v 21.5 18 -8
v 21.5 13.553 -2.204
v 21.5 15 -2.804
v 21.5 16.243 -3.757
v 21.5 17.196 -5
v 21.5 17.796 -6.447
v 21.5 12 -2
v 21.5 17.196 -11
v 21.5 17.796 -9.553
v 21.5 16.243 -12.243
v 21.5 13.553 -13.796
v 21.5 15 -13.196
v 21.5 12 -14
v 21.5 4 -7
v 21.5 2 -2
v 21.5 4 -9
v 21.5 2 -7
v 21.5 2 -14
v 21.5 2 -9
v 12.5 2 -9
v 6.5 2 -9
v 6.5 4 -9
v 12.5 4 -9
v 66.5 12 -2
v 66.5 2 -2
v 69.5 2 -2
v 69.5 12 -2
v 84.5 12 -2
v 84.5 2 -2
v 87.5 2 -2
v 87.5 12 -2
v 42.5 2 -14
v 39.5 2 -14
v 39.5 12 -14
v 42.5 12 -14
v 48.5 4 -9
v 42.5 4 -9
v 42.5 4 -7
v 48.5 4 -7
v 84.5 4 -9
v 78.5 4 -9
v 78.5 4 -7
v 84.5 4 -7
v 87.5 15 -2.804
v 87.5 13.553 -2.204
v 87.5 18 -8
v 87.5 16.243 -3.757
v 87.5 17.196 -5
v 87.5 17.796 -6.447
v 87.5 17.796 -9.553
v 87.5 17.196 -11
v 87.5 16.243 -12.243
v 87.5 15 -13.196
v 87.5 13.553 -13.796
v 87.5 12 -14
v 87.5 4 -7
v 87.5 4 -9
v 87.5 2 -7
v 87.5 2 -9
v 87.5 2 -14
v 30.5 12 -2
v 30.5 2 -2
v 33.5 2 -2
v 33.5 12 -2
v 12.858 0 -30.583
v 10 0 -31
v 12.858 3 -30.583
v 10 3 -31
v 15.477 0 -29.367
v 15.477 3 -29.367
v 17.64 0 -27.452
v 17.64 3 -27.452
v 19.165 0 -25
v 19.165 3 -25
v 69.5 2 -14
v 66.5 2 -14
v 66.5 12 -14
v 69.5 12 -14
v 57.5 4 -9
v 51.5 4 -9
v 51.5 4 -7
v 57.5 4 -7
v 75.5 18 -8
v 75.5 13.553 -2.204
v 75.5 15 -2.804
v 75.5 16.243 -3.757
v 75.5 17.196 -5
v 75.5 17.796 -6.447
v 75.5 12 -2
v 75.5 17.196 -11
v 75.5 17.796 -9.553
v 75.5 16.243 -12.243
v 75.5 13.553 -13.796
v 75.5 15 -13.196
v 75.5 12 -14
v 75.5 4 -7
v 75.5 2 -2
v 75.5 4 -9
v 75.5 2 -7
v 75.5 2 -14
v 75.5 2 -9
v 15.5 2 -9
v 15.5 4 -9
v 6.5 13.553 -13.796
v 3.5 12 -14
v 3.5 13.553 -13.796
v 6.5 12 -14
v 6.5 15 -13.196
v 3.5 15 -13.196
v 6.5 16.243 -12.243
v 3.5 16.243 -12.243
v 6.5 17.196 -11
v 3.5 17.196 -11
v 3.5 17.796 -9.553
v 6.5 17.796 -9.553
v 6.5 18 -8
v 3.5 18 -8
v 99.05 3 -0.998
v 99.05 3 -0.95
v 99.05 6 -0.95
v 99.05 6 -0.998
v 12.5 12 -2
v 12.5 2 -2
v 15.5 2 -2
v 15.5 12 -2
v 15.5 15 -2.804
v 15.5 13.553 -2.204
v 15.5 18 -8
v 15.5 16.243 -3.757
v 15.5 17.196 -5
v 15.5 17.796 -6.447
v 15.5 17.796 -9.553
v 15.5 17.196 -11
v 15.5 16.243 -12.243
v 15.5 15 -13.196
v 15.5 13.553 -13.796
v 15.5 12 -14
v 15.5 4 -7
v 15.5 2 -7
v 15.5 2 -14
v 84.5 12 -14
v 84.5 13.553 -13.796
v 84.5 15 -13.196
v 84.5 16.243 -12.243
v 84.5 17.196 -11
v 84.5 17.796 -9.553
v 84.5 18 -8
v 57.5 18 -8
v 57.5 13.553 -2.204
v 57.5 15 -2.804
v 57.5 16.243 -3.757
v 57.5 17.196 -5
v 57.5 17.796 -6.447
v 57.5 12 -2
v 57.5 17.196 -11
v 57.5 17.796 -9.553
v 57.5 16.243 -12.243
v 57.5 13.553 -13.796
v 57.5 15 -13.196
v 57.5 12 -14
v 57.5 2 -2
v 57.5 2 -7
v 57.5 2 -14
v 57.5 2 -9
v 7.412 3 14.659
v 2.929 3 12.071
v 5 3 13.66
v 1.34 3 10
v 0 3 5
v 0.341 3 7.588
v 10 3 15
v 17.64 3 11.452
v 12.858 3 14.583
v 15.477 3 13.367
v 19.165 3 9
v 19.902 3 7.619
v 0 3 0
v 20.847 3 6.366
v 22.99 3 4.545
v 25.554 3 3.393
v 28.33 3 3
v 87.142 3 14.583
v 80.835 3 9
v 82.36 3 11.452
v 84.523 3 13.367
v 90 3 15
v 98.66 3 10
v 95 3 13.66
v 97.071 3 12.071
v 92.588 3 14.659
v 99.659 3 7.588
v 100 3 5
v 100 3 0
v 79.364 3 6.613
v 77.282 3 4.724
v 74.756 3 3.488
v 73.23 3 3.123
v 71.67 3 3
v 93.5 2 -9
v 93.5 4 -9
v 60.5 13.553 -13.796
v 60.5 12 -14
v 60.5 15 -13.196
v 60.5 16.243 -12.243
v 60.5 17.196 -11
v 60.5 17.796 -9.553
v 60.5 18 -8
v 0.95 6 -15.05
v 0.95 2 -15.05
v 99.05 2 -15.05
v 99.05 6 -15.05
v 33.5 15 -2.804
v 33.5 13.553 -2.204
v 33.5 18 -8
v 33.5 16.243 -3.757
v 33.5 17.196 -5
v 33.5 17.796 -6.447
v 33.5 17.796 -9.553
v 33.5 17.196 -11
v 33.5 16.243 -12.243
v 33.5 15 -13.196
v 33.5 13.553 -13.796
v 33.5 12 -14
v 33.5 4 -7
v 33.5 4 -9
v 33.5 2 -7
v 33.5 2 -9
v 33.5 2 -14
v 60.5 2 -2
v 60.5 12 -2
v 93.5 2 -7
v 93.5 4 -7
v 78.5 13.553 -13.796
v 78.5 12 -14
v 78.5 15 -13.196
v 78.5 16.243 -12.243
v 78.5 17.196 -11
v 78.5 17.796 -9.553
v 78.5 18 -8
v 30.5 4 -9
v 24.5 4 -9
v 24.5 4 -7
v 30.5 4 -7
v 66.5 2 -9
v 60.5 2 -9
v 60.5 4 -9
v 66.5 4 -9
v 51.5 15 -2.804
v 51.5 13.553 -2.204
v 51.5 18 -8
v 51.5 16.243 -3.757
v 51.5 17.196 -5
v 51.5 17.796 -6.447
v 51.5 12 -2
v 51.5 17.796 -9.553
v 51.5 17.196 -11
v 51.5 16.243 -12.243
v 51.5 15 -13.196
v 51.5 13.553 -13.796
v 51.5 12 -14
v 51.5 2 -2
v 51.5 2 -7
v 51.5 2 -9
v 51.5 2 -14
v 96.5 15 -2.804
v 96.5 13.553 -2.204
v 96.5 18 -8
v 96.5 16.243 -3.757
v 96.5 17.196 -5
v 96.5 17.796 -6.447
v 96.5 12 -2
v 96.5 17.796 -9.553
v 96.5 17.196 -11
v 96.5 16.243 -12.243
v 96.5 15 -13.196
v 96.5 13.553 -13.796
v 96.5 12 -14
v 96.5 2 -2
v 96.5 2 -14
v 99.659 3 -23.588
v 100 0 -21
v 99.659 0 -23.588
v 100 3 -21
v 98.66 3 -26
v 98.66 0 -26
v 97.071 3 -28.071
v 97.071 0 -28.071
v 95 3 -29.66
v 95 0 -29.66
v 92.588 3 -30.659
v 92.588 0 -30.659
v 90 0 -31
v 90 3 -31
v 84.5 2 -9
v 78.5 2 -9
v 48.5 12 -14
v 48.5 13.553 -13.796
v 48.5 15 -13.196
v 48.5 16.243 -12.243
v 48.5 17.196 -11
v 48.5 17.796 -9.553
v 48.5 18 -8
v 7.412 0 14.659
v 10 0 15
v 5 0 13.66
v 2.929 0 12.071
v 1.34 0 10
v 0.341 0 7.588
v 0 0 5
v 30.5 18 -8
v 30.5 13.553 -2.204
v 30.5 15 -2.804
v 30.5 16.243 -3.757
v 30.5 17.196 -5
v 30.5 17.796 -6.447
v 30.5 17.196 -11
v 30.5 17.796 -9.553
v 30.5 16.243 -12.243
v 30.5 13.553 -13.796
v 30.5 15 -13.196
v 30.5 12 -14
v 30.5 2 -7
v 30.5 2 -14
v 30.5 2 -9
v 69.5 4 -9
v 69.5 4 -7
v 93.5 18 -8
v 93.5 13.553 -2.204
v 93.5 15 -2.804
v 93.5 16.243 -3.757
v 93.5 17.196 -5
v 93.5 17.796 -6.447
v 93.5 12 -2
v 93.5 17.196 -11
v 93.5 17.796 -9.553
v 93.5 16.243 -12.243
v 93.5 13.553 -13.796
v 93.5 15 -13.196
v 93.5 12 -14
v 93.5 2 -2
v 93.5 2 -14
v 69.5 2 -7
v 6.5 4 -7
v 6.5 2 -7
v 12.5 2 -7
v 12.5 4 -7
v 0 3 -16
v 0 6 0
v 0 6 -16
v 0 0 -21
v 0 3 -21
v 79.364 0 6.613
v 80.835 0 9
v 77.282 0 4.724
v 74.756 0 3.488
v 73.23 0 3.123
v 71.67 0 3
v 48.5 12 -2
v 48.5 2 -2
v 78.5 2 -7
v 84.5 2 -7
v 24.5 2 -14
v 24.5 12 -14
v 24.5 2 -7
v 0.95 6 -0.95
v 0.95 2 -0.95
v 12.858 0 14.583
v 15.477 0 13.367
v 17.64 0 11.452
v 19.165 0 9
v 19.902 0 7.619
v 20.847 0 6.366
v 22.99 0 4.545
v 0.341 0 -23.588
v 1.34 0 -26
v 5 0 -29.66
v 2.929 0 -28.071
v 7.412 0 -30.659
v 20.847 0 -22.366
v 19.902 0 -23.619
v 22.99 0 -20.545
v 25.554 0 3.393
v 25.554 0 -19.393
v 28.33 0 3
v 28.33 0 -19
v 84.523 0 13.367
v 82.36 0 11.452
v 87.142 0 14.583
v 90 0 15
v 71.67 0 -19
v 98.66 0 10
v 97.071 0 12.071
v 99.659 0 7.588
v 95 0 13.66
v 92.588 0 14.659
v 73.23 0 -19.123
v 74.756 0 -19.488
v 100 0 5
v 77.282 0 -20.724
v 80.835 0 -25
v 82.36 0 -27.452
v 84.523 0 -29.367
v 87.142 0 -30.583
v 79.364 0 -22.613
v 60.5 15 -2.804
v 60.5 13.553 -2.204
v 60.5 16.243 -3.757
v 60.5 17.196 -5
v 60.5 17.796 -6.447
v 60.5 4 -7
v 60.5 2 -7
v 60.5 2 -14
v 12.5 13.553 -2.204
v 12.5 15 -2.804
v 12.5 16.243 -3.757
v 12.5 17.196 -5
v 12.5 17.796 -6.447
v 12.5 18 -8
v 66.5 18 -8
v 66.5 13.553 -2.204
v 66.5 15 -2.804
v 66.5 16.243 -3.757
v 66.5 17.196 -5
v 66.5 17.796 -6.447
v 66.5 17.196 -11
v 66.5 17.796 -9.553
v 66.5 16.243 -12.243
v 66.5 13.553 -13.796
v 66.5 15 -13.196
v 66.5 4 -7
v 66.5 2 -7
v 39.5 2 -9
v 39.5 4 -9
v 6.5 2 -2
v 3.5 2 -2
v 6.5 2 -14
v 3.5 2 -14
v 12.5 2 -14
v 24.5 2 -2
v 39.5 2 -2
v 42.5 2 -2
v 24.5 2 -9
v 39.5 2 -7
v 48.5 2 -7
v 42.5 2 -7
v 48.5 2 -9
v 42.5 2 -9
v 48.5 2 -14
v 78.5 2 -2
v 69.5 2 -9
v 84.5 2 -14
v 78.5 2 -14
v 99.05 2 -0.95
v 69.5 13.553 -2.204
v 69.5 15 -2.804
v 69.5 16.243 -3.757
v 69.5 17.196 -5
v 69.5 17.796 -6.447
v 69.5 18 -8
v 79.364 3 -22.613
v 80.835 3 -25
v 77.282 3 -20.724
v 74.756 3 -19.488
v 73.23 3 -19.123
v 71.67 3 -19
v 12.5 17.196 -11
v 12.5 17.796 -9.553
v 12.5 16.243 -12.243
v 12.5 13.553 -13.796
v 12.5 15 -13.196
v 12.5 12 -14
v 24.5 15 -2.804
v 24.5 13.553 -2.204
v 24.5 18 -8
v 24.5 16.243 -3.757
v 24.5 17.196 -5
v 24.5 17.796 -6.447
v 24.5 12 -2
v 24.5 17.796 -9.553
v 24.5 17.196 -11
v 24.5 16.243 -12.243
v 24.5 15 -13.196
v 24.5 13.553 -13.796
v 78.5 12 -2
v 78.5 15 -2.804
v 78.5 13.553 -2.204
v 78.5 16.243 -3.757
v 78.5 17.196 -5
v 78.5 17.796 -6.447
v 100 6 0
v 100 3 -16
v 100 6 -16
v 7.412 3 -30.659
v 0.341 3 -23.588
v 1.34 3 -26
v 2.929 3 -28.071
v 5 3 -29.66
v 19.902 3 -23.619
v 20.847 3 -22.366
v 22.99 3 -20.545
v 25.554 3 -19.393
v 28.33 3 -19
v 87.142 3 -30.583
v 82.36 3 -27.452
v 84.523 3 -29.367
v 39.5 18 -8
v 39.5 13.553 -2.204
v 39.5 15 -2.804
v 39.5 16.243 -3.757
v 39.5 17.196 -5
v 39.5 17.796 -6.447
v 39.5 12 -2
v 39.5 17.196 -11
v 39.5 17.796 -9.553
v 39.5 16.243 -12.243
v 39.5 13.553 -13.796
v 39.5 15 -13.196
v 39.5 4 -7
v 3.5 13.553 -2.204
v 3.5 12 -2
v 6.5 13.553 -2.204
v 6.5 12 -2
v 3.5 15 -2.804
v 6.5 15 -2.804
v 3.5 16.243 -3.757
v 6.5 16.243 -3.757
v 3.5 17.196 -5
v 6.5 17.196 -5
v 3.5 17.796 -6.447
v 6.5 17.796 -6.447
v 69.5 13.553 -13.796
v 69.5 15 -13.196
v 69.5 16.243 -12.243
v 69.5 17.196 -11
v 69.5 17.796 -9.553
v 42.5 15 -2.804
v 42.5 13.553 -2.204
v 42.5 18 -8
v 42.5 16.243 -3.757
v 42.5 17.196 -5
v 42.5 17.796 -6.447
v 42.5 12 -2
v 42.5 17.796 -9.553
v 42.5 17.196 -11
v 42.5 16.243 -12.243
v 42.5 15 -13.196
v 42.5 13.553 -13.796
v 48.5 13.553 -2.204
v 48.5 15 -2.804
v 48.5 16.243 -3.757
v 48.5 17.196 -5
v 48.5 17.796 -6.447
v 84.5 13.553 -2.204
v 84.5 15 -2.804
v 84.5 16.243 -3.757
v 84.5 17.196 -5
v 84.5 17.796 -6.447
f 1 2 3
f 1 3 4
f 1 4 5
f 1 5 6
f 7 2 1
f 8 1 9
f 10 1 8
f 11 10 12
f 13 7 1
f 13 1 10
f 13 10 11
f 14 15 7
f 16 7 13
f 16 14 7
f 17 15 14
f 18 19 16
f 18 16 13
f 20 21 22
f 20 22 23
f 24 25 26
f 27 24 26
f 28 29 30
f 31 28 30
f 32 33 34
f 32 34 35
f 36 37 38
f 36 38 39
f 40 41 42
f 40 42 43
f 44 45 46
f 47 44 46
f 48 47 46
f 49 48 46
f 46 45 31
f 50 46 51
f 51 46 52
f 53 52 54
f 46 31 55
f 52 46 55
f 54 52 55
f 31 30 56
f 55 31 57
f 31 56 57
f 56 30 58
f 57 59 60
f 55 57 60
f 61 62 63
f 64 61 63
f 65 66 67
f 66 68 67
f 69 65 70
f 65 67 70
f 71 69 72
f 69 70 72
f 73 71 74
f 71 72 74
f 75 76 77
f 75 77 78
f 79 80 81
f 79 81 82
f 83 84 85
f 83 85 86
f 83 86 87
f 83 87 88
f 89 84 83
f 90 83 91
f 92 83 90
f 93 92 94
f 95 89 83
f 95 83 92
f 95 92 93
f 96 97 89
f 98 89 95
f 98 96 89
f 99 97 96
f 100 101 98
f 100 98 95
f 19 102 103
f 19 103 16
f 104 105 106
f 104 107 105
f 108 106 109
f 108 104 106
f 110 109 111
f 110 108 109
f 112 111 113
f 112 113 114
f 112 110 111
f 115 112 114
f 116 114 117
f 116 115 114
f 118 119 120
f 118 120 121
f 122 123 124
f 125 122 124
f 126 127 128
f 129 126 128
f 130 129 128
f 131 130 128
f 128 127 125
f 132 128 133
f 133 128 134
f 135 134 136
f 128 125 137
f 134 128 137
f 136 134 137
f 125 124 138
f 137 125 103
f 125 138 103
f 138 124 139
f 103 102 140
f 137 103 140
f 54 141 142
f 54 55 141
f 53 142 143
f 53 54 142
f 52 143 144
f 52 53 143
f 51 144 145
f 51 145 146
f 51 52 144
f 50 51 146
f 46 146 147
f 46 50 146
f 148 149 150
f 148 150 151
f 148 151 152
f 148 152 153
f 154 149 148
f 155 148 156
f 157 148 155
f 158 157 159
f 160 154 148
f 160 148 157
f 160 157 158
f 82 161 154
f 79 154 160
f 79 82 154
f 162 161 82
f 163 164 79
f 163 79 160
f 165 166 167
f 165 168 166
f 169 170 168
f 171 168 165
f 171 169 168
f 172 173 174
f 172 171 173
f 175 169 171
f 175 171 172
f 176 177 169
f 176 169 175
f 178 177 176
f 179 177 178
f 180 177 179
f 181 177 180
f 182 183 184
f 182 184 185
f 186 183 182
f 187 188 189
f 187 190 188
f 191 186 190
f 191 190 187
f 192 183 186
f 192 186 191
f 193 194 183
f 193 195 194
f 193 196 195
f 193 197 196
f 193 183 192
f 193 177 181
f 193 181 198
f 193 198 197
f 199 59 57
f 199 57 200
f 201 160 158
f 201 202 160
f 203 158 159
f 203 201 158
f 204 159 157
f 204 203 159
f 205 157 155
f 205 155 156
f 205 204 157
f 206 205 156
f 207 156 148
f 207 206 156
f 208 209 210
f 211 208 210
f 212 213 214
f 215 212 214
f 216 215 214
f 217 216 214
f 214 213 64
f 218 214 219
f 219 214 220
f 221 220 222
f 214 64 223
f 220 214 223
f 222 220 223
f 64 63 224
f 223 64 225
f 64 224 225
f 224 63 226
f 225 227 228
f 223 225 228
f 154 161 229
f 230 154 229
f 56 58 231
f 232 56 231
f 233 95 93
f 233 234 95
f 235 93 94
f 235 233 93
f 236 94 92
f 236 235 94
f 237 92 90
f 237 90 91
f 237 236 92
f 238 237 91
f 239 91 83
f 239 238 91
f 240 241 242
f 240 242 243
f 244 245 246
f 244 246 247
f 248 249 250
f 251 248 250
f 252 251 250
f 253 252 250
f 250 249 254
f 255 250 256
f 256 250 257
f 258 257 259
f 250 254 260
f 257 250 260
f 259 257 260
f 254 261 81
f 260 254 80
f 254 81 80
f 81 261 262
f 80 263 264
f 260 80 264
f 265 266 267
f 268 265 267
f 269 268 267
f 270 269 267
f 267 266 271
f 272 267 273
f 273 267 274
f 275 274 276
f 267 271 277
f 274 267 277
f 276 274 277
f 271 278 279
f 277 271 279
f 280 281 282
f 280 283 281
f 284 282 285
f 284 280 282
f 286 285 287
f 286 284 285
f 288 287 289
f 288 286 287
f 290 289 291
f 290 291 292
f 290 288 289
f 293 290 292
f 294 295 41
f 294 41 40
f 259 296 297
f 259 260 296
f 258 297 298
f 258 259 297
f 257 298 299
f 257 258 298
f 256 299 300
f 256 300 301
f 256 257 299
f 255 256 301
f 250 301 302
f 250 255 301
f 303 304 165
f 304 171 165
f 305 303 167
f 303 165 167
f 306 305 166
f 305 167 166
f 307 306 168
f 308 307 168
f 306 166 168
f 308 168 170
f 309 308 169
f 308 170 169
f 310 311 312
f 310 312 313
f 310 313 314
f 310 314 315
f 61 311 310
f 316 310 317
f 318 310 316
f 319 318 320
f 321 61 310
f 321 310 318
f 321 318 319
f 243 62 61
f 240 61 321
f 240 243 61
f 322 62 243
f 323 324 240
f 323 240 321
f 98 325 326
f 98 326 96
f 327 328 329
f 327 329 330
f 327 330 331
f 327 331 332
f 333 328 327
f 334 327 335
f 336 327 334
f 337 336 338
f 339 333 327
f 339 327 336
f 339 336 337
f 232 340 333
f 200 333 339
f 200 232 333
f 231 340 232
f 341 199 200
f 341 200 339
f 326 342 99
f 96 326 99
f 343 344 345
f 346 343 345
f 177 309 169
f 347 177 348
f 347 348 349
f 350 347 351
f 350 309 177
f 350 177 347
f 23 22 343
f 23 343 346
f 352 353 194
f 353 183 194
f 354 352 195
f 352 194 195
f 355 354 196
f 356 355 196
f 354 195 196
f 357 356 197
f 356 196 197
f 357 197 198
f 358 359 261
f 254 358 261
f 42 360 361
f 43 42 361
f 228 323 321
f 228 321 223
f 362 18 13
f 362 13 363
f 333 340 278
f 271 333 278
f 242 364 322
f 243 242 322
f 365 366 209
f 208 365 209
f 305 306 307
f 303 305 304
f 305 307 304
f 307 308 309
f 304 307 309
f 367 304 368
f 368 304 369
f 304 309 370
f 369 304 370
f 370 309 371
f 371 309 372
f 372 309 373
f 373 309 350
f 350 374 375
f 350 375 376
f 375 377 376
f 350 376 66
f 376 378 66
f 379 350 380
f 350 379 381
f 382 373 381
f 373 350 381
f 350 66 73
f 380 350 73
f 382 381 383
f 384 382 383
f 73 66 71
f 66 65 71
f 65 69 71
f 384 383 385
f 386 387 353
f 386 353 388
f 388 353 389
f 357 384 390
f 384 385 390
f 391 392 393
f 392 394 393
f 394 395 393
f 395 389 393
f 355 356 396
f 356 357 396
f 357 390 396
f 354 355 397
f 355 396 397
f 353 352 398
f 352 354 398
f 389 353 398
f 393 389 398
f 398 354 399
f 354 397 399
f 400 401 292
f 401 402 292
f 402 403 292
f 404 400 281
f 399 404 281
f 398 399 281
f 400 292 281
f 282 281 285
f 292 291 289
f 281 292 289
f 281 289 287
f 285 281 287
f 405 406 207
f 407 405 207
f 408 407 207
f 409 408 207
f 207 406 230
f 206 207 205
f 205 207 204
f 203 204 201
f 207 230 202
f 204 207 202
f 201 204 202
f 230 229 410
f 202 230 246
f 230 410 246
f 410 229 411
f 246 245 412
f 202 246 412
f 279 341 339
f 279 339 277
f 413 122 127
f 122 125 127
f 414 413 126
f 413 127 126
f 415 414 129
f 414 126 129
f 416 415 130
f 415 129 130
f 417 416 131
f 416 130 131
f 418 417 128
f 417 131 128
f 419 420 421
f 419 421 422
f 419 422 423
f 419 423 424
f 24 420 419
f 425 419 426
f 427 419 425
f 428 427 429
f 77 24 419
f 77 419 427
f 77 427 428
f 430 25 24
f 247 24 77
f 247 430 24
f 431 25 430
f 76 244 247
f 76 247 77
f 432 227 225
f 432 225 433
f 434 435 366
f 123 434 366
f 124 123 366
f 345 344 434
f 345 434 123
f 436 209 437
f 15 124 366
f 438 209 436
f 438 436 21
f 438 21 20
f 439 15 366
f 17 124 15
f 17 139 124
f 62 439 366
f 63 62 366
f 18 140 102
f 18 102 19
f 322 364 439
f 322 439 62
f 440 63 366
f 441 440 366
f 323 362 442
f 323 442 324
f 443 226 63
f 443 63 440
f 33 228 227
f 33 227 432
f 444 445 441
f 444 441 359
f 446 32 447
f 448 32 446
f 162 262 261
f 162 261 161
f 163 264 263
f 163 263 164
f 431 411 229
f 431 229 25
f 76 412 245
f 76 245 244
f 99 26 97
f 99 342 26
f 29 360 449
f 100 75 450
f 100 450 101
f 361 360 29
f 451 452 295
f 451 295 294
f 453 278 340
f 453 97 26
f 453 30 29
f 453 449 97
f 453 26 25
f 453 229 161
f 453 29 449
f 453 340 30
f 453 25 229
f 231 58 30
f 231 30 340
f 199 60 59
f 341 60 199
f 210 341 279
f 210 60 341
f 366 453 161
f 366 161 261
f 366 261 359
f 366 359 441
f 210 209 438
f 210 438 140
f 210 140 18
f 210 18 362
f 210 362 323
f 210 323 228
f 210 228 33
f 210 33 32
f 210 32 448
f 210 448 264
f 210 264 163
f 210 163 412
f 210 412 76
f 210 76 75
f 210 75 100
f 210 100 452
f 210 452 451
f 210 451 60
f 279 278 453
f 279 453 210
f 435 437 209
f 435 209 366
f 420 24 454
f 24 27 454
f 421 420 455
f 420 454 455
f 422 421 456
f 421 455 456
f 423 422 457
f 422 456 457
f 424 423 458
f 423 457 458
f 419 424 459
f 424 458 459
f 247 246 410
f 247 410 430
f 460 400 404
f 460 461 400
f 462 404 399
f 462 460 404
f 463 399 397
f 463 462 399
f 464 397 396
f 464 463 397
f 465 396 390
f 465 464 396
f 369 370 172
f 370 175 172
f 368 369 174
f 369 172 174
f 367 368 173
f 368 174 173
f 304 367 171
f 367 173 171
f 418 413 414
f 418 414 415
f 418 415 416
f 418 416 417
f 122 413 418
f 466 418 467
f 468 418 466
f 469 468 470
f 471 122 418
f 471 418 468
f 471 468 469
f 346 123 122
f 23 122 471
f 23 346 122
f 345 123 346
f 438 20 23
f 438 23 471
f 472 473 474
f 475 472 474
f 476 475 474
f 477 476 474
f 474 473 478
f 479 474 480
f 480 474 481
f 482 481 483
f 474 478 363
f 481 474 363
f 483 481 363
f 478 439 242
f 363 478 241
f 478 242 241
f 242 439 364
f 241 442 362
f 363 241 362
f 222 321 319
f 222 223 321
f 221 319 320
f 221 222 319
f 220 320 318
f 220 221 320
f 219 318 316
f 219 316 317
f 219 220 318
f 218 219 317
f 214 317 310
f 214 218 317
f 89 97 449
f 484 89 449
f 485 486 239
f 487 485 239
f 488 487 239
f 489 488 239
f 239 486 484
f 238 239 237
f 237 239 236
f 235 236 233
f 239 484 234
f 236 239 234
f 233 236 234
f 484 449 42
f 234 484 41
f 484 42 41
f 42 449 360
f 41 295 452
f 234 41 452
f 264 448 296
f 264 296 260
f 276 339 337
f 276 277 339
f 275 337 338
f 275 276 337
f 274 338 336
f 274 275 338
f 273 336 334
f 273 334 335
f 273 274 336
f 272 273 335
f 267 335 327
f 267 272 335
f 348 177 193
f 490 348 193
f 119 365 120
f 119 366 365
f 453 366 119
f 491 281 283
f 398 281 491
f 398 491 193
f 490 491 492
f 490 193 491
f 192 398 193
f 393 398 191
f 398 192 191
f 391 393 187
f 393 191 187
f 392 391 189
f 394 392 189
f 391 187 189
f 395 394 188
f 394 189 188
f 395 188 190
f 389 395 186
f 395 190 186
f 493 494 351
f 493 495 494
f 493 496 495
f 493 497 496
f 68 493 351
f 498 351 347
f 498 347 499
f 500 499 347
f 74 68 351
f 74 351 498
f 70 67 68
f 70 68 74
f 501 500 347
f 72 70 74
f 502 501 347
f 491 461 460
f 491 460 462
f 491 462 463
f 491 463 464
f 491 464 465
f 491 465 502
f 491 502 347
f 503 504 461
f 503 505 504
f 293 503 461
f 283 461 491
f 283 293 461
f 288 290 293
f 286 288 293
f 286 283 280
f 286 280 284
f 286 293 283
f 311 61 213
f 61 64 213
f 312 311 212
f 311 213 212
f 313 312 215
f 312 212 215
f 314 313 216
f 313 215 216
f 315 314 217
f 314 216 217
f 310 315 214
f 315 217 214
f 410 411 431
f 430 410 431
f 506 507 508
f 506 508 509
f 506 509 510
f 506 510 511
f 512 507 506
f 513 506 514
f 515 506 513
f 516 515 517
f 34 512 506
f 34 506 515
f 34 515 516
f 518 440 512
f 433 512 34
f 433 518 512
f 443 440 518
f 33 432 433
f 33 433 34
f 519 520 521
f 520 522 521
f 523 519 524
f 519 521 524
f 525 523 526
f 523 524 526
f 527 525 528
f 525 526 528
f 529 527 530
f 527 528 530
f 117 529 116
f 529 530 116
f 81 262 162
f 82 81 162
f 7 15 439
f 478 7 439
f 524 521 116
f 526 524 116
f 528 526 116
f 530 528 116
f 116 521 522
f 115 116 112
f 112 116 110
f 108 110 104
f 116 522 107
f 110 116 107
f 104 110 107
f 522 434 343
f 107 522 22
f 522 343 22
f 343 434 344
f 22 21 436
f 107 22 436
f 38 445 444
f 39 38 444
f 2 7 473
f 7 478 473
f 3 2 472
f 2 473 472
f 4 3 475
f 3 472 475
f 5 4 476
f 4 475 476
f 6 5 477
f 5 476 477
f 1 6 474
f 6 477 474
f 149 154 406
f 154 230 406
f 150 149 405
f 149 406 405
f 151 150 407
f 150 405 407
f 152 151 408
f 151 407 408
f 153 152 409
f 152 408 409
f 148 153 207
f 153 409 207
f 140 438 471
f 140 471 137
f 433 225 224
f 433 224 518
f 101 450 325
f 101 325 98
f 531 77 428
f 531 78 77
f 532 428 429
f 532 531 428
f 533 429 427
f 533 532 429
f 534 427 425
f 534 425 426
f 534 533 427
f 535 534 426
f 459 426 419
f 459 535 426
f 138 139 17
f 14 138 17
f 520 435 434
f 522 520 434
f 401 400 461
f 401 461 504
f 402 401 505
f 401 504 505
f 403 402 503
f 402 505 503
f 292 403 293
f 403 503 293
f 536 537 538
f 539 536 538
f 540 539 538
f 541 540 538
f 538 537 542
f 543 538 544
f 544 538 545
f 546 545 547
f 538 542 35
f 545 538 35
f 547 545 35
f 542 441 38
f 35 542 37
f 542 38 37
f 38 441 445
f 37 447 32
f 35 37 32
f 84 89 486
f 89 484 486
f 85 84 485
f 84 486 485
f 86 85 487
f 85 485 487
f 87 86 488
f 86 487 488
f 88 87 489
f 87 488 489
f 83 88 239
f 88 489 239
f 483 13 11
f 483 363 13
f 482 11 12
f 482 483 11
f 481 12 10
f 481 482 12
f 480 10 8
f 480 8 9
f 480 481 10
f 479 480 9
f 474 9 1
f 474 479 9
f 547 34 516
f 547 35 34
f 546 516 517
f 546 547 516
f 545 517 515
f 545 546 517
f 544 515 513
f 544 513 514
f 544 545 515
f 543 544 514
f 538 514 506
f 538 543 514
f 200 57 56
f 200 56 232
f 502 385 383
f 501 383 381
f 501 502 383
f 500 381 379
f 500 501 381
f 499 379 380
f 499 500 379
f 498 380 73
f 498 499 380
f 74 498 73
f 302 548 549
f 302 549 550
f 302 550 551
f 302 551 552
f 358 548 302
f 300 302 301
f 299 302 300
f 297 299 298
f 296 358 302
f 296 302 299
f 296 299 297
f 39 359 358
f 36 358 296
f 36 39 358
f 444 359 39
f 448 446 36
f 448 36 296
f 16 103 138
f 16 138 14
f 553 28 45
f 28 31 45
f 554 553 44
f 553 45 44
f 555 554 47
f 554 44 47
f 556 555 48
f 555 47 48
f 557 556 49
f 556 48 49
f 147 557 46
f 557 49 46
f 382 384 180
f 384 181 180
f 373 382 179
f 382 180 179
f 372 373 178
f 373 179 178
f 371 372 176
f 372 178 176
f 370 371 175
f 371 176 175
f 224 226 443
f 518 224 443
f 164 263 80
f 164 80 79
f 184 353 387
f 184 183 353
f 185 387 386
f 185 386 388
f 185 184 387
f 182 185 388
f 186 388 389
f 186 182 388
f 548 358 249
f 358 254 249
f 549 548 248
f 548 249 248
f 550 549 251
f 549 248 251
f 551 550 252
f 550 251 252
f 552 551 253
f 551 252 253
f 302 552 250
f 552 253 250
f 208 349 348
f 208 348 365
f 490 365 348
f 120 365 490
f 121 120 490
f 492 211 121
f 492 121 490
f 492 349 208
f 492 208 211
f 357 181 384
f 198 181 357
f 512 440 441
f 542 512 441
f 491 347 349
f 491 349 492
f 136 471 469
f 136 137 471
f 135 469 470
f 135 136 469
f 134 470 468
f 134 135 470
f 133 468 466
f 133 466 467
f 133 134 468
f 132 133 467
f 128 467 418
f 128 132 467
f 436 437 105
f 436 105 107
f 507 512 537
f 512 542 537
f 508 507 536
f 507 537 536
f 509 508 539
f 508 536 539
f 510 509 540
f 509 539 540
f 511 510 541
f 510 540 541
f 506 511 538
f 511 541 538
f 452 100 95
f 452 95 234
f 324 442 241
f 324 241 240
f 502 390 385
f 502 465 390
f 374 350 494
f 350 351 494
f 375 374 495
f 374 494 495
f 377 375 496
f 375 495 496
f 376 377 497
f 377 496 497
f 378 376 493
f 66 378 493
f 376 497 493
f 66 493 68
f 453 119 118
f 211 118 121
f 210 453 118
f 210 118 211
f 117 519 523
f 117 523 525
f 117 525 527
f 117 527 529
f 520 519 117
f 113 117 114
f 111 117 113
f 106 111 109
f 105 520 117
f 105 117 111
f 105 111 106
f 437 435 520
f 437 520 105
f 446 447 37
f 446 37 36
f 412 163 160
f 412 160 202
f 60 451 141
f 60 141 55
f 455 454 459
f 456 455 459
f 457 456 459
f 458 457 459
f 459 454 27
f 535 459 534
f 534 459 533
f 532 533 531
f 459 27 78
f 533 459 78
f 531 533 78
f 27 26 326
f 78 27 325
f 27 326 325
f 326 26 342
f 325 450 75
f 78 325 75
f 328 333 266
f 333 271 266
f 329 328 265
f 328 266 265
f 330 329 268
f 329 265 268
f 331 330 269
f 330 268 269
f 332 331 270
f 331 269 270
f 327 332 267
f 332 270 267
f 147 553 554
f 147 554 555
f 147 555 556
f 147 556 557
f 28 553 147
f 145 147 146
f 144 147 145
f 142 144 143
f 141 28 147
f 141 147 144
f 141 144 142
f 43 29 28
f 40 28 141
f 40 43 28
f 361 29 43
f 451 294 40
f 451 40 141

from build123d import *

# Parameters (mm, degrees)
SKETCH1_W            = 100
SKETCH1_H            = 16
BOSS_EXTRUDE1_DEPTH  = 3
SKETCH2_W            = 98
SKETCH2_H            = 14
CUT_EXTRUDE1_DEPTH   = 1
SKETCH5_W            = 20
SKETCH5_H            = 3
BOSS_EXTRUDE4_DEPTH  = 15
SKETCH6_W            = 20
SKETCH6_H            = 3
BOSS_EXTRUDE5_DEPTH  = 15
FILLET18_R           = 10
SKETCH7_W            = 3
SKETCH7_H            = 12
BOSS_EXTRUDE6_DEPTH  = 16
SKETCH8_W            = 6
SKETCH8_H            = 2
BOSS_EXTRUDE7_DEPTH  = 2
FILLET19_R           = 6
SKETCH10_W           = 60
SKETCH10_H           = 3
BOSS_EXTRUDE8_DEPTH  = 3
SKETCH11_W           = 60
SKETCH11_H           = 3
BOSS_EXTRUDE9_DEPTH  = 3
SKETCH12_W           = 0.95
SKETCH12_H           = 14
BOSS_EXTRUDE10_DEPTH = 3
SKETCH13_W           = 100
SKETCH13_H           = 0.95
BOSS_EXTRUDE11_DEPTH = 3
SKETCH14_W           = 0.95
SKETCH14_H           = 0.052088128
BOSS_EXTRUDE12_DEPTH = 3
SKETCH15_W           = 0.95
SKETCH15_H           = 0.047911872
SKETCH15_W_2         = 0.949734752
SKETCH15_H_2         = 0.052088128
BOSS_EXTRUDE13_DEPTH = 3
FILLET20_R           = 10
SKETCH17_W           = 98.1
SKETCH17_H           = 14.1
SKETCH17_W_2         = 97.1
SKETCH17_H_2         = 13.1
CUT_EXTRUDE2_DEPTH   = 4


with BuildPart() as part:
    # Sketch1 → Boss-Extrude1 (new body)
    with BuildSketch(Plane(origin=(0, 0, 0), x_dir=(1, 0, 0), z_dir=(0, 1, 0))):
        with Locations((50, 8)):
            Rectangle(SKETCH1_W, SKETCH1_H)
    extrude(amount=BOSS_EXTRUDE1_DEPTH)

    # Sketch2 → Cut-Extrude1 (cut)
    with BuildSketch(Plane(origin=(0, 3, 0), x_dir=(1, 0, 0), z_dir=(0, 1, 0))):
        with Locations((50, 8)):
            Rectangle(SKETCH2_W, SKETCH2_H)
    extrude(amount=-CUT_EXTRUDE1_DEPTH, mode=Mode.SUBTRACT)

    # Sketch5 → Boss-Extrude4 (add)
    with BuildSketch(Plane.XY):
        with Locations((10, 1.5)):
            Rectangle(SKETCH5_W, SKETCH5_H)
        with Locations((90, 1.5)):
            Rectangle(SKETCH5_W, SKETCH5_H)
    extrude(amount=BOSS_EXTRUDE4_DEPTH)

    # Sketch6 → Boss-Extrude5 (add)
    with BuildSketch(Plane(origin=(0, 0, -16), x_dir=(-1, 0, 0), z_dir=(0, 0, -1))):
        with Locations((-90, 1.5)):
            Rectangle(SKETCH6_W, SKETCH6_H)
        with Locations((-10, 1.5)):
            Rectangle(SKETCH6_W, SKETCH6_H)
    extrude(amount=BOSS_EXTRUDE5_DEPTH)

    # Fillet18
    fillet18_edges = [part.edges().sort_by_distance(p)[0] for p in [
        (20, 1.5, 15),
        (0, 1.5, 15),
        (80, 1.5, 15),
        (100, 1.5, 15),
        (0, 1.5, -31),
        (20, 1.5, -31),
        (80, 1.5, -31),
        (100, 1.5, -31),
    ]]
    fillet(fillet18_edges, radius=FILLET18_R - 0.0001)  # a hair under: the kernel refuses the full size

    # Sketch7 → Boss-Extrude6 (add)
    with BuildSketch(Plane(origin=(0, 2, 0), x_dir=(1, 0, 0), z_dir=(0, 1, 0))):
        with Locations((95, 8)):
            Rectangle(SKETCH7_W, SKETCH7_H)
        with Locations((86, 8)):
            Rectangle(SKETCH7_W, SKETCH7_H)
        with Locations((77, 8)):
            Rectangle(SKETCH7_W, SKETCH7_H)
        with Locations((68, 8)):
            Rectangle(SKETCH7_W, SKETCH7_H)
        with Locations((59, 8)):
            Rectangle(SKETCH7_W, SKETCH7_H)
        with Locations((50, 8)):
            Rectangle(SKETCH7_W, SKETCH7_H)
        with Locations((41, 8)):
            Rectangle(SKETCH7_W, SKETCH7_H)
        with Locations((32, 8)):
            Rectangle(SKETCH7_W, SKETCH7_H)
        with Locations((23, 8)):
            Rectangle(SKETCH7_W, SKETCH7_H)
        with Locations((14, 8)):
            Rectangle(SKETCH7_W, SKETCH7_H)
        with Locations((5, 8)):
            Rectangle(SKETCH7_W, SKETCH7_H)
    extrude(amount=BOSS_EXTRUDE6_DEPTH)

    # Sketch8 → Boss-Extrude7 (add)
    with BuildSketch(Plane(origin=(0, 2, 0), x_dir=(1, 0, 0), z_dir=(0, 1, 0))):
        with Locations((90.5, 8)):
            Rectangle(SKETCH8_W, SKETCH8_H)
        with Locations((81.5, 8)):
            Rectangle(SKETCH8_W, SKETCH8_H)
        with Locations((72.5, 8)):
            Rectangle(SKETCH8_W, SKETCH8_H)
        with Locations((63.5, 8)):
            Rectangle(SKETCH8_W, SKETCH8_H)
        with Locations((54.5, 8)):
            Rectangle(SKETCH8_W, SKETCH8_H)
        with Locations((45.5, 8)):
            Rectangle(SKETCH8_W, SKETCH8_H)
        with Locations((36.5, 8)):
            Rectangle(SKETCH8_W, SKETCH8_H)
        with Locations((27.5, 8)):
            Rectangle(SKETCH8_W, SKETCH8_H)
        with Locations((18.5, 8)):
            Rectangle(SKETCH8_W, SKETCH8_H)
        with Locations((9.5, 8)):
            Rectangle(SKETCH8_W, SKETCH8_H)
    extrude(amount=BOSS_EXTRUDE7_DEPTH)

    # Fillet19
    fillet19_edges = [part.edges().sort_by_distance(p)[0] for p in [
        (95, 18, -2),
        (95, 18, -14),
        (86, 18, -2),
        (86, 18, -14),
        (77, 18, -2),
        (77, 18, -14),
        (68, 18, -2),
        (68, 18, -14),
        (59, 18, -2),
        (59, 18, -14),
        (50, 18, -2),
        (50, 18, -14),
        (41, 18, -2),
        (41, 18, -14),
        (32, 18, -2),
        (32, 18, -14),
        (23, 18, -14),
        (23, 18, -2),
        (14, 18, -2),
        (14, 18, -14),
        (5, 18, -2),
        (5, 18, -14),
    ]]
    fillet(fillet19_edges, radius=FILLET19_R - 0.0001)  # a hair under: the kernel refuses the full size

    # Sketch10 → Boss-Extrude8 (add)
    with BuildSketch(Plane(origin=(0, 0, -16), x_dir=(-1, 0, 0), z_dir=(0, 0, -1))):
        with Locations((-50, 1.5)):
            Rectangle(SKETCH10_W, SKETCH10_H)
    extrude(amount=BOSS_EXTRUDE8_DEPTH)

    # Sketch11 → Boss-Extrude9 (add)
    with BuildSketch(Plane.XY):
        with Locations((50, 1.5)):
            Rectangle(SKETCH11_W, SKETCH11_H)
    extrude(amount=BOSS_EXTRUDE9_DEPTH)

    # Sketch12 → Boss-Extrude10 (add)
    with BuildSketch(Plane(origin=(0, 3, 0), x_dir=(1, 0, 0), z_dir=(0, 1, 0))):
        with Locations((99.525, 7.997911872)):
            Rectangle(SKETCH12_W, SKETCH12_H)
        with Locations((0.475, 7.997911872)):
            Rectangle(SKETCH12_W, SKETCH12_H)
    extrude(amount=BOSS_EXTRUDE10_DEPTH)

    # Sketch13 → Boss-Extrude11 (add)
    with BuildSketch(Plane(origin=(0, 3, 0), x_dir=(1, 0, 0), z_dir=(0, 1, 0))):
        with Locations((50, 15.525)):
            Rectangle(SKETCH13_W, SKETCH13_H)
        with Locations((50, 0.475)):
            Rectangle(SKETCH13_W, SKETCH13_H)
    extrude(amount=BOSS_EXTRUDE11_DEPTH)

    # Sketch14 → Boss-Extrude12 (add)
    with BuildSketch(Plane(origin=(0, 3, 0), x_dir=(1, 0, 0), z_dir=(0, 1, 0))):
        with Locations((0.475, 15.023955936)):
            Rectangle(SKETCH14_W, SKETCH14_H)
    extrude(amount=BOSS_EXTRUDE12_DEPTH)

    # Sketch15 → Boss-Extrude13 (add)
    with BuildSketch(Plane(origin=(0, 3, 0), x_dir=(1, 0, 0), z_dir=(0, 1, 0))):
        with Locations((0.475, 0.973955936)):
            Rectangle(SKETCH15_W, SKETCH15_H)
        with Locations((99.525132624, 0.973955936)):
            Rectangle(SKETCH15_W_2, SKETCH15_H)
        with Locations((99.525, 15.023955936)):
            Rectangle(SKETCH15_W, SKETCH15_H_2)
    extrude(amount=BOSS_EXTRUDE13_DEPTH)

    # Fillet20
    fillet20_edges = [part.edges().sort_by_distance(p)[0] for p in [
        (20, 1.5, -19),
        (80, 1.5, -19),
        (80, 1.5, 3),
        (20, 1.5, 3),
    ]]
    fillet(fillet20_edges, radius=FILLET20_R)

    # Sketch17 → Cut-Extrude2 (cut)
    with BuildSketch(Plane(origin=(0, 6, 0), x_dir=(1, 0, 0), z_dir=(0, 1, 0))):
        with Locations((50, 8)):
            Rectangle(SKETCH17_W, SKETCH17_H)
        with Locations((50, 8)):
            Rectangle(SKETCH17_W_2, SKETCH17_H_2, mode=Mode.SUBTRACT)
    extrude(amount=-CUT_EXTRUDE2_DEPTH, mode=Mode.SUBTRACT)


solid = part.part
